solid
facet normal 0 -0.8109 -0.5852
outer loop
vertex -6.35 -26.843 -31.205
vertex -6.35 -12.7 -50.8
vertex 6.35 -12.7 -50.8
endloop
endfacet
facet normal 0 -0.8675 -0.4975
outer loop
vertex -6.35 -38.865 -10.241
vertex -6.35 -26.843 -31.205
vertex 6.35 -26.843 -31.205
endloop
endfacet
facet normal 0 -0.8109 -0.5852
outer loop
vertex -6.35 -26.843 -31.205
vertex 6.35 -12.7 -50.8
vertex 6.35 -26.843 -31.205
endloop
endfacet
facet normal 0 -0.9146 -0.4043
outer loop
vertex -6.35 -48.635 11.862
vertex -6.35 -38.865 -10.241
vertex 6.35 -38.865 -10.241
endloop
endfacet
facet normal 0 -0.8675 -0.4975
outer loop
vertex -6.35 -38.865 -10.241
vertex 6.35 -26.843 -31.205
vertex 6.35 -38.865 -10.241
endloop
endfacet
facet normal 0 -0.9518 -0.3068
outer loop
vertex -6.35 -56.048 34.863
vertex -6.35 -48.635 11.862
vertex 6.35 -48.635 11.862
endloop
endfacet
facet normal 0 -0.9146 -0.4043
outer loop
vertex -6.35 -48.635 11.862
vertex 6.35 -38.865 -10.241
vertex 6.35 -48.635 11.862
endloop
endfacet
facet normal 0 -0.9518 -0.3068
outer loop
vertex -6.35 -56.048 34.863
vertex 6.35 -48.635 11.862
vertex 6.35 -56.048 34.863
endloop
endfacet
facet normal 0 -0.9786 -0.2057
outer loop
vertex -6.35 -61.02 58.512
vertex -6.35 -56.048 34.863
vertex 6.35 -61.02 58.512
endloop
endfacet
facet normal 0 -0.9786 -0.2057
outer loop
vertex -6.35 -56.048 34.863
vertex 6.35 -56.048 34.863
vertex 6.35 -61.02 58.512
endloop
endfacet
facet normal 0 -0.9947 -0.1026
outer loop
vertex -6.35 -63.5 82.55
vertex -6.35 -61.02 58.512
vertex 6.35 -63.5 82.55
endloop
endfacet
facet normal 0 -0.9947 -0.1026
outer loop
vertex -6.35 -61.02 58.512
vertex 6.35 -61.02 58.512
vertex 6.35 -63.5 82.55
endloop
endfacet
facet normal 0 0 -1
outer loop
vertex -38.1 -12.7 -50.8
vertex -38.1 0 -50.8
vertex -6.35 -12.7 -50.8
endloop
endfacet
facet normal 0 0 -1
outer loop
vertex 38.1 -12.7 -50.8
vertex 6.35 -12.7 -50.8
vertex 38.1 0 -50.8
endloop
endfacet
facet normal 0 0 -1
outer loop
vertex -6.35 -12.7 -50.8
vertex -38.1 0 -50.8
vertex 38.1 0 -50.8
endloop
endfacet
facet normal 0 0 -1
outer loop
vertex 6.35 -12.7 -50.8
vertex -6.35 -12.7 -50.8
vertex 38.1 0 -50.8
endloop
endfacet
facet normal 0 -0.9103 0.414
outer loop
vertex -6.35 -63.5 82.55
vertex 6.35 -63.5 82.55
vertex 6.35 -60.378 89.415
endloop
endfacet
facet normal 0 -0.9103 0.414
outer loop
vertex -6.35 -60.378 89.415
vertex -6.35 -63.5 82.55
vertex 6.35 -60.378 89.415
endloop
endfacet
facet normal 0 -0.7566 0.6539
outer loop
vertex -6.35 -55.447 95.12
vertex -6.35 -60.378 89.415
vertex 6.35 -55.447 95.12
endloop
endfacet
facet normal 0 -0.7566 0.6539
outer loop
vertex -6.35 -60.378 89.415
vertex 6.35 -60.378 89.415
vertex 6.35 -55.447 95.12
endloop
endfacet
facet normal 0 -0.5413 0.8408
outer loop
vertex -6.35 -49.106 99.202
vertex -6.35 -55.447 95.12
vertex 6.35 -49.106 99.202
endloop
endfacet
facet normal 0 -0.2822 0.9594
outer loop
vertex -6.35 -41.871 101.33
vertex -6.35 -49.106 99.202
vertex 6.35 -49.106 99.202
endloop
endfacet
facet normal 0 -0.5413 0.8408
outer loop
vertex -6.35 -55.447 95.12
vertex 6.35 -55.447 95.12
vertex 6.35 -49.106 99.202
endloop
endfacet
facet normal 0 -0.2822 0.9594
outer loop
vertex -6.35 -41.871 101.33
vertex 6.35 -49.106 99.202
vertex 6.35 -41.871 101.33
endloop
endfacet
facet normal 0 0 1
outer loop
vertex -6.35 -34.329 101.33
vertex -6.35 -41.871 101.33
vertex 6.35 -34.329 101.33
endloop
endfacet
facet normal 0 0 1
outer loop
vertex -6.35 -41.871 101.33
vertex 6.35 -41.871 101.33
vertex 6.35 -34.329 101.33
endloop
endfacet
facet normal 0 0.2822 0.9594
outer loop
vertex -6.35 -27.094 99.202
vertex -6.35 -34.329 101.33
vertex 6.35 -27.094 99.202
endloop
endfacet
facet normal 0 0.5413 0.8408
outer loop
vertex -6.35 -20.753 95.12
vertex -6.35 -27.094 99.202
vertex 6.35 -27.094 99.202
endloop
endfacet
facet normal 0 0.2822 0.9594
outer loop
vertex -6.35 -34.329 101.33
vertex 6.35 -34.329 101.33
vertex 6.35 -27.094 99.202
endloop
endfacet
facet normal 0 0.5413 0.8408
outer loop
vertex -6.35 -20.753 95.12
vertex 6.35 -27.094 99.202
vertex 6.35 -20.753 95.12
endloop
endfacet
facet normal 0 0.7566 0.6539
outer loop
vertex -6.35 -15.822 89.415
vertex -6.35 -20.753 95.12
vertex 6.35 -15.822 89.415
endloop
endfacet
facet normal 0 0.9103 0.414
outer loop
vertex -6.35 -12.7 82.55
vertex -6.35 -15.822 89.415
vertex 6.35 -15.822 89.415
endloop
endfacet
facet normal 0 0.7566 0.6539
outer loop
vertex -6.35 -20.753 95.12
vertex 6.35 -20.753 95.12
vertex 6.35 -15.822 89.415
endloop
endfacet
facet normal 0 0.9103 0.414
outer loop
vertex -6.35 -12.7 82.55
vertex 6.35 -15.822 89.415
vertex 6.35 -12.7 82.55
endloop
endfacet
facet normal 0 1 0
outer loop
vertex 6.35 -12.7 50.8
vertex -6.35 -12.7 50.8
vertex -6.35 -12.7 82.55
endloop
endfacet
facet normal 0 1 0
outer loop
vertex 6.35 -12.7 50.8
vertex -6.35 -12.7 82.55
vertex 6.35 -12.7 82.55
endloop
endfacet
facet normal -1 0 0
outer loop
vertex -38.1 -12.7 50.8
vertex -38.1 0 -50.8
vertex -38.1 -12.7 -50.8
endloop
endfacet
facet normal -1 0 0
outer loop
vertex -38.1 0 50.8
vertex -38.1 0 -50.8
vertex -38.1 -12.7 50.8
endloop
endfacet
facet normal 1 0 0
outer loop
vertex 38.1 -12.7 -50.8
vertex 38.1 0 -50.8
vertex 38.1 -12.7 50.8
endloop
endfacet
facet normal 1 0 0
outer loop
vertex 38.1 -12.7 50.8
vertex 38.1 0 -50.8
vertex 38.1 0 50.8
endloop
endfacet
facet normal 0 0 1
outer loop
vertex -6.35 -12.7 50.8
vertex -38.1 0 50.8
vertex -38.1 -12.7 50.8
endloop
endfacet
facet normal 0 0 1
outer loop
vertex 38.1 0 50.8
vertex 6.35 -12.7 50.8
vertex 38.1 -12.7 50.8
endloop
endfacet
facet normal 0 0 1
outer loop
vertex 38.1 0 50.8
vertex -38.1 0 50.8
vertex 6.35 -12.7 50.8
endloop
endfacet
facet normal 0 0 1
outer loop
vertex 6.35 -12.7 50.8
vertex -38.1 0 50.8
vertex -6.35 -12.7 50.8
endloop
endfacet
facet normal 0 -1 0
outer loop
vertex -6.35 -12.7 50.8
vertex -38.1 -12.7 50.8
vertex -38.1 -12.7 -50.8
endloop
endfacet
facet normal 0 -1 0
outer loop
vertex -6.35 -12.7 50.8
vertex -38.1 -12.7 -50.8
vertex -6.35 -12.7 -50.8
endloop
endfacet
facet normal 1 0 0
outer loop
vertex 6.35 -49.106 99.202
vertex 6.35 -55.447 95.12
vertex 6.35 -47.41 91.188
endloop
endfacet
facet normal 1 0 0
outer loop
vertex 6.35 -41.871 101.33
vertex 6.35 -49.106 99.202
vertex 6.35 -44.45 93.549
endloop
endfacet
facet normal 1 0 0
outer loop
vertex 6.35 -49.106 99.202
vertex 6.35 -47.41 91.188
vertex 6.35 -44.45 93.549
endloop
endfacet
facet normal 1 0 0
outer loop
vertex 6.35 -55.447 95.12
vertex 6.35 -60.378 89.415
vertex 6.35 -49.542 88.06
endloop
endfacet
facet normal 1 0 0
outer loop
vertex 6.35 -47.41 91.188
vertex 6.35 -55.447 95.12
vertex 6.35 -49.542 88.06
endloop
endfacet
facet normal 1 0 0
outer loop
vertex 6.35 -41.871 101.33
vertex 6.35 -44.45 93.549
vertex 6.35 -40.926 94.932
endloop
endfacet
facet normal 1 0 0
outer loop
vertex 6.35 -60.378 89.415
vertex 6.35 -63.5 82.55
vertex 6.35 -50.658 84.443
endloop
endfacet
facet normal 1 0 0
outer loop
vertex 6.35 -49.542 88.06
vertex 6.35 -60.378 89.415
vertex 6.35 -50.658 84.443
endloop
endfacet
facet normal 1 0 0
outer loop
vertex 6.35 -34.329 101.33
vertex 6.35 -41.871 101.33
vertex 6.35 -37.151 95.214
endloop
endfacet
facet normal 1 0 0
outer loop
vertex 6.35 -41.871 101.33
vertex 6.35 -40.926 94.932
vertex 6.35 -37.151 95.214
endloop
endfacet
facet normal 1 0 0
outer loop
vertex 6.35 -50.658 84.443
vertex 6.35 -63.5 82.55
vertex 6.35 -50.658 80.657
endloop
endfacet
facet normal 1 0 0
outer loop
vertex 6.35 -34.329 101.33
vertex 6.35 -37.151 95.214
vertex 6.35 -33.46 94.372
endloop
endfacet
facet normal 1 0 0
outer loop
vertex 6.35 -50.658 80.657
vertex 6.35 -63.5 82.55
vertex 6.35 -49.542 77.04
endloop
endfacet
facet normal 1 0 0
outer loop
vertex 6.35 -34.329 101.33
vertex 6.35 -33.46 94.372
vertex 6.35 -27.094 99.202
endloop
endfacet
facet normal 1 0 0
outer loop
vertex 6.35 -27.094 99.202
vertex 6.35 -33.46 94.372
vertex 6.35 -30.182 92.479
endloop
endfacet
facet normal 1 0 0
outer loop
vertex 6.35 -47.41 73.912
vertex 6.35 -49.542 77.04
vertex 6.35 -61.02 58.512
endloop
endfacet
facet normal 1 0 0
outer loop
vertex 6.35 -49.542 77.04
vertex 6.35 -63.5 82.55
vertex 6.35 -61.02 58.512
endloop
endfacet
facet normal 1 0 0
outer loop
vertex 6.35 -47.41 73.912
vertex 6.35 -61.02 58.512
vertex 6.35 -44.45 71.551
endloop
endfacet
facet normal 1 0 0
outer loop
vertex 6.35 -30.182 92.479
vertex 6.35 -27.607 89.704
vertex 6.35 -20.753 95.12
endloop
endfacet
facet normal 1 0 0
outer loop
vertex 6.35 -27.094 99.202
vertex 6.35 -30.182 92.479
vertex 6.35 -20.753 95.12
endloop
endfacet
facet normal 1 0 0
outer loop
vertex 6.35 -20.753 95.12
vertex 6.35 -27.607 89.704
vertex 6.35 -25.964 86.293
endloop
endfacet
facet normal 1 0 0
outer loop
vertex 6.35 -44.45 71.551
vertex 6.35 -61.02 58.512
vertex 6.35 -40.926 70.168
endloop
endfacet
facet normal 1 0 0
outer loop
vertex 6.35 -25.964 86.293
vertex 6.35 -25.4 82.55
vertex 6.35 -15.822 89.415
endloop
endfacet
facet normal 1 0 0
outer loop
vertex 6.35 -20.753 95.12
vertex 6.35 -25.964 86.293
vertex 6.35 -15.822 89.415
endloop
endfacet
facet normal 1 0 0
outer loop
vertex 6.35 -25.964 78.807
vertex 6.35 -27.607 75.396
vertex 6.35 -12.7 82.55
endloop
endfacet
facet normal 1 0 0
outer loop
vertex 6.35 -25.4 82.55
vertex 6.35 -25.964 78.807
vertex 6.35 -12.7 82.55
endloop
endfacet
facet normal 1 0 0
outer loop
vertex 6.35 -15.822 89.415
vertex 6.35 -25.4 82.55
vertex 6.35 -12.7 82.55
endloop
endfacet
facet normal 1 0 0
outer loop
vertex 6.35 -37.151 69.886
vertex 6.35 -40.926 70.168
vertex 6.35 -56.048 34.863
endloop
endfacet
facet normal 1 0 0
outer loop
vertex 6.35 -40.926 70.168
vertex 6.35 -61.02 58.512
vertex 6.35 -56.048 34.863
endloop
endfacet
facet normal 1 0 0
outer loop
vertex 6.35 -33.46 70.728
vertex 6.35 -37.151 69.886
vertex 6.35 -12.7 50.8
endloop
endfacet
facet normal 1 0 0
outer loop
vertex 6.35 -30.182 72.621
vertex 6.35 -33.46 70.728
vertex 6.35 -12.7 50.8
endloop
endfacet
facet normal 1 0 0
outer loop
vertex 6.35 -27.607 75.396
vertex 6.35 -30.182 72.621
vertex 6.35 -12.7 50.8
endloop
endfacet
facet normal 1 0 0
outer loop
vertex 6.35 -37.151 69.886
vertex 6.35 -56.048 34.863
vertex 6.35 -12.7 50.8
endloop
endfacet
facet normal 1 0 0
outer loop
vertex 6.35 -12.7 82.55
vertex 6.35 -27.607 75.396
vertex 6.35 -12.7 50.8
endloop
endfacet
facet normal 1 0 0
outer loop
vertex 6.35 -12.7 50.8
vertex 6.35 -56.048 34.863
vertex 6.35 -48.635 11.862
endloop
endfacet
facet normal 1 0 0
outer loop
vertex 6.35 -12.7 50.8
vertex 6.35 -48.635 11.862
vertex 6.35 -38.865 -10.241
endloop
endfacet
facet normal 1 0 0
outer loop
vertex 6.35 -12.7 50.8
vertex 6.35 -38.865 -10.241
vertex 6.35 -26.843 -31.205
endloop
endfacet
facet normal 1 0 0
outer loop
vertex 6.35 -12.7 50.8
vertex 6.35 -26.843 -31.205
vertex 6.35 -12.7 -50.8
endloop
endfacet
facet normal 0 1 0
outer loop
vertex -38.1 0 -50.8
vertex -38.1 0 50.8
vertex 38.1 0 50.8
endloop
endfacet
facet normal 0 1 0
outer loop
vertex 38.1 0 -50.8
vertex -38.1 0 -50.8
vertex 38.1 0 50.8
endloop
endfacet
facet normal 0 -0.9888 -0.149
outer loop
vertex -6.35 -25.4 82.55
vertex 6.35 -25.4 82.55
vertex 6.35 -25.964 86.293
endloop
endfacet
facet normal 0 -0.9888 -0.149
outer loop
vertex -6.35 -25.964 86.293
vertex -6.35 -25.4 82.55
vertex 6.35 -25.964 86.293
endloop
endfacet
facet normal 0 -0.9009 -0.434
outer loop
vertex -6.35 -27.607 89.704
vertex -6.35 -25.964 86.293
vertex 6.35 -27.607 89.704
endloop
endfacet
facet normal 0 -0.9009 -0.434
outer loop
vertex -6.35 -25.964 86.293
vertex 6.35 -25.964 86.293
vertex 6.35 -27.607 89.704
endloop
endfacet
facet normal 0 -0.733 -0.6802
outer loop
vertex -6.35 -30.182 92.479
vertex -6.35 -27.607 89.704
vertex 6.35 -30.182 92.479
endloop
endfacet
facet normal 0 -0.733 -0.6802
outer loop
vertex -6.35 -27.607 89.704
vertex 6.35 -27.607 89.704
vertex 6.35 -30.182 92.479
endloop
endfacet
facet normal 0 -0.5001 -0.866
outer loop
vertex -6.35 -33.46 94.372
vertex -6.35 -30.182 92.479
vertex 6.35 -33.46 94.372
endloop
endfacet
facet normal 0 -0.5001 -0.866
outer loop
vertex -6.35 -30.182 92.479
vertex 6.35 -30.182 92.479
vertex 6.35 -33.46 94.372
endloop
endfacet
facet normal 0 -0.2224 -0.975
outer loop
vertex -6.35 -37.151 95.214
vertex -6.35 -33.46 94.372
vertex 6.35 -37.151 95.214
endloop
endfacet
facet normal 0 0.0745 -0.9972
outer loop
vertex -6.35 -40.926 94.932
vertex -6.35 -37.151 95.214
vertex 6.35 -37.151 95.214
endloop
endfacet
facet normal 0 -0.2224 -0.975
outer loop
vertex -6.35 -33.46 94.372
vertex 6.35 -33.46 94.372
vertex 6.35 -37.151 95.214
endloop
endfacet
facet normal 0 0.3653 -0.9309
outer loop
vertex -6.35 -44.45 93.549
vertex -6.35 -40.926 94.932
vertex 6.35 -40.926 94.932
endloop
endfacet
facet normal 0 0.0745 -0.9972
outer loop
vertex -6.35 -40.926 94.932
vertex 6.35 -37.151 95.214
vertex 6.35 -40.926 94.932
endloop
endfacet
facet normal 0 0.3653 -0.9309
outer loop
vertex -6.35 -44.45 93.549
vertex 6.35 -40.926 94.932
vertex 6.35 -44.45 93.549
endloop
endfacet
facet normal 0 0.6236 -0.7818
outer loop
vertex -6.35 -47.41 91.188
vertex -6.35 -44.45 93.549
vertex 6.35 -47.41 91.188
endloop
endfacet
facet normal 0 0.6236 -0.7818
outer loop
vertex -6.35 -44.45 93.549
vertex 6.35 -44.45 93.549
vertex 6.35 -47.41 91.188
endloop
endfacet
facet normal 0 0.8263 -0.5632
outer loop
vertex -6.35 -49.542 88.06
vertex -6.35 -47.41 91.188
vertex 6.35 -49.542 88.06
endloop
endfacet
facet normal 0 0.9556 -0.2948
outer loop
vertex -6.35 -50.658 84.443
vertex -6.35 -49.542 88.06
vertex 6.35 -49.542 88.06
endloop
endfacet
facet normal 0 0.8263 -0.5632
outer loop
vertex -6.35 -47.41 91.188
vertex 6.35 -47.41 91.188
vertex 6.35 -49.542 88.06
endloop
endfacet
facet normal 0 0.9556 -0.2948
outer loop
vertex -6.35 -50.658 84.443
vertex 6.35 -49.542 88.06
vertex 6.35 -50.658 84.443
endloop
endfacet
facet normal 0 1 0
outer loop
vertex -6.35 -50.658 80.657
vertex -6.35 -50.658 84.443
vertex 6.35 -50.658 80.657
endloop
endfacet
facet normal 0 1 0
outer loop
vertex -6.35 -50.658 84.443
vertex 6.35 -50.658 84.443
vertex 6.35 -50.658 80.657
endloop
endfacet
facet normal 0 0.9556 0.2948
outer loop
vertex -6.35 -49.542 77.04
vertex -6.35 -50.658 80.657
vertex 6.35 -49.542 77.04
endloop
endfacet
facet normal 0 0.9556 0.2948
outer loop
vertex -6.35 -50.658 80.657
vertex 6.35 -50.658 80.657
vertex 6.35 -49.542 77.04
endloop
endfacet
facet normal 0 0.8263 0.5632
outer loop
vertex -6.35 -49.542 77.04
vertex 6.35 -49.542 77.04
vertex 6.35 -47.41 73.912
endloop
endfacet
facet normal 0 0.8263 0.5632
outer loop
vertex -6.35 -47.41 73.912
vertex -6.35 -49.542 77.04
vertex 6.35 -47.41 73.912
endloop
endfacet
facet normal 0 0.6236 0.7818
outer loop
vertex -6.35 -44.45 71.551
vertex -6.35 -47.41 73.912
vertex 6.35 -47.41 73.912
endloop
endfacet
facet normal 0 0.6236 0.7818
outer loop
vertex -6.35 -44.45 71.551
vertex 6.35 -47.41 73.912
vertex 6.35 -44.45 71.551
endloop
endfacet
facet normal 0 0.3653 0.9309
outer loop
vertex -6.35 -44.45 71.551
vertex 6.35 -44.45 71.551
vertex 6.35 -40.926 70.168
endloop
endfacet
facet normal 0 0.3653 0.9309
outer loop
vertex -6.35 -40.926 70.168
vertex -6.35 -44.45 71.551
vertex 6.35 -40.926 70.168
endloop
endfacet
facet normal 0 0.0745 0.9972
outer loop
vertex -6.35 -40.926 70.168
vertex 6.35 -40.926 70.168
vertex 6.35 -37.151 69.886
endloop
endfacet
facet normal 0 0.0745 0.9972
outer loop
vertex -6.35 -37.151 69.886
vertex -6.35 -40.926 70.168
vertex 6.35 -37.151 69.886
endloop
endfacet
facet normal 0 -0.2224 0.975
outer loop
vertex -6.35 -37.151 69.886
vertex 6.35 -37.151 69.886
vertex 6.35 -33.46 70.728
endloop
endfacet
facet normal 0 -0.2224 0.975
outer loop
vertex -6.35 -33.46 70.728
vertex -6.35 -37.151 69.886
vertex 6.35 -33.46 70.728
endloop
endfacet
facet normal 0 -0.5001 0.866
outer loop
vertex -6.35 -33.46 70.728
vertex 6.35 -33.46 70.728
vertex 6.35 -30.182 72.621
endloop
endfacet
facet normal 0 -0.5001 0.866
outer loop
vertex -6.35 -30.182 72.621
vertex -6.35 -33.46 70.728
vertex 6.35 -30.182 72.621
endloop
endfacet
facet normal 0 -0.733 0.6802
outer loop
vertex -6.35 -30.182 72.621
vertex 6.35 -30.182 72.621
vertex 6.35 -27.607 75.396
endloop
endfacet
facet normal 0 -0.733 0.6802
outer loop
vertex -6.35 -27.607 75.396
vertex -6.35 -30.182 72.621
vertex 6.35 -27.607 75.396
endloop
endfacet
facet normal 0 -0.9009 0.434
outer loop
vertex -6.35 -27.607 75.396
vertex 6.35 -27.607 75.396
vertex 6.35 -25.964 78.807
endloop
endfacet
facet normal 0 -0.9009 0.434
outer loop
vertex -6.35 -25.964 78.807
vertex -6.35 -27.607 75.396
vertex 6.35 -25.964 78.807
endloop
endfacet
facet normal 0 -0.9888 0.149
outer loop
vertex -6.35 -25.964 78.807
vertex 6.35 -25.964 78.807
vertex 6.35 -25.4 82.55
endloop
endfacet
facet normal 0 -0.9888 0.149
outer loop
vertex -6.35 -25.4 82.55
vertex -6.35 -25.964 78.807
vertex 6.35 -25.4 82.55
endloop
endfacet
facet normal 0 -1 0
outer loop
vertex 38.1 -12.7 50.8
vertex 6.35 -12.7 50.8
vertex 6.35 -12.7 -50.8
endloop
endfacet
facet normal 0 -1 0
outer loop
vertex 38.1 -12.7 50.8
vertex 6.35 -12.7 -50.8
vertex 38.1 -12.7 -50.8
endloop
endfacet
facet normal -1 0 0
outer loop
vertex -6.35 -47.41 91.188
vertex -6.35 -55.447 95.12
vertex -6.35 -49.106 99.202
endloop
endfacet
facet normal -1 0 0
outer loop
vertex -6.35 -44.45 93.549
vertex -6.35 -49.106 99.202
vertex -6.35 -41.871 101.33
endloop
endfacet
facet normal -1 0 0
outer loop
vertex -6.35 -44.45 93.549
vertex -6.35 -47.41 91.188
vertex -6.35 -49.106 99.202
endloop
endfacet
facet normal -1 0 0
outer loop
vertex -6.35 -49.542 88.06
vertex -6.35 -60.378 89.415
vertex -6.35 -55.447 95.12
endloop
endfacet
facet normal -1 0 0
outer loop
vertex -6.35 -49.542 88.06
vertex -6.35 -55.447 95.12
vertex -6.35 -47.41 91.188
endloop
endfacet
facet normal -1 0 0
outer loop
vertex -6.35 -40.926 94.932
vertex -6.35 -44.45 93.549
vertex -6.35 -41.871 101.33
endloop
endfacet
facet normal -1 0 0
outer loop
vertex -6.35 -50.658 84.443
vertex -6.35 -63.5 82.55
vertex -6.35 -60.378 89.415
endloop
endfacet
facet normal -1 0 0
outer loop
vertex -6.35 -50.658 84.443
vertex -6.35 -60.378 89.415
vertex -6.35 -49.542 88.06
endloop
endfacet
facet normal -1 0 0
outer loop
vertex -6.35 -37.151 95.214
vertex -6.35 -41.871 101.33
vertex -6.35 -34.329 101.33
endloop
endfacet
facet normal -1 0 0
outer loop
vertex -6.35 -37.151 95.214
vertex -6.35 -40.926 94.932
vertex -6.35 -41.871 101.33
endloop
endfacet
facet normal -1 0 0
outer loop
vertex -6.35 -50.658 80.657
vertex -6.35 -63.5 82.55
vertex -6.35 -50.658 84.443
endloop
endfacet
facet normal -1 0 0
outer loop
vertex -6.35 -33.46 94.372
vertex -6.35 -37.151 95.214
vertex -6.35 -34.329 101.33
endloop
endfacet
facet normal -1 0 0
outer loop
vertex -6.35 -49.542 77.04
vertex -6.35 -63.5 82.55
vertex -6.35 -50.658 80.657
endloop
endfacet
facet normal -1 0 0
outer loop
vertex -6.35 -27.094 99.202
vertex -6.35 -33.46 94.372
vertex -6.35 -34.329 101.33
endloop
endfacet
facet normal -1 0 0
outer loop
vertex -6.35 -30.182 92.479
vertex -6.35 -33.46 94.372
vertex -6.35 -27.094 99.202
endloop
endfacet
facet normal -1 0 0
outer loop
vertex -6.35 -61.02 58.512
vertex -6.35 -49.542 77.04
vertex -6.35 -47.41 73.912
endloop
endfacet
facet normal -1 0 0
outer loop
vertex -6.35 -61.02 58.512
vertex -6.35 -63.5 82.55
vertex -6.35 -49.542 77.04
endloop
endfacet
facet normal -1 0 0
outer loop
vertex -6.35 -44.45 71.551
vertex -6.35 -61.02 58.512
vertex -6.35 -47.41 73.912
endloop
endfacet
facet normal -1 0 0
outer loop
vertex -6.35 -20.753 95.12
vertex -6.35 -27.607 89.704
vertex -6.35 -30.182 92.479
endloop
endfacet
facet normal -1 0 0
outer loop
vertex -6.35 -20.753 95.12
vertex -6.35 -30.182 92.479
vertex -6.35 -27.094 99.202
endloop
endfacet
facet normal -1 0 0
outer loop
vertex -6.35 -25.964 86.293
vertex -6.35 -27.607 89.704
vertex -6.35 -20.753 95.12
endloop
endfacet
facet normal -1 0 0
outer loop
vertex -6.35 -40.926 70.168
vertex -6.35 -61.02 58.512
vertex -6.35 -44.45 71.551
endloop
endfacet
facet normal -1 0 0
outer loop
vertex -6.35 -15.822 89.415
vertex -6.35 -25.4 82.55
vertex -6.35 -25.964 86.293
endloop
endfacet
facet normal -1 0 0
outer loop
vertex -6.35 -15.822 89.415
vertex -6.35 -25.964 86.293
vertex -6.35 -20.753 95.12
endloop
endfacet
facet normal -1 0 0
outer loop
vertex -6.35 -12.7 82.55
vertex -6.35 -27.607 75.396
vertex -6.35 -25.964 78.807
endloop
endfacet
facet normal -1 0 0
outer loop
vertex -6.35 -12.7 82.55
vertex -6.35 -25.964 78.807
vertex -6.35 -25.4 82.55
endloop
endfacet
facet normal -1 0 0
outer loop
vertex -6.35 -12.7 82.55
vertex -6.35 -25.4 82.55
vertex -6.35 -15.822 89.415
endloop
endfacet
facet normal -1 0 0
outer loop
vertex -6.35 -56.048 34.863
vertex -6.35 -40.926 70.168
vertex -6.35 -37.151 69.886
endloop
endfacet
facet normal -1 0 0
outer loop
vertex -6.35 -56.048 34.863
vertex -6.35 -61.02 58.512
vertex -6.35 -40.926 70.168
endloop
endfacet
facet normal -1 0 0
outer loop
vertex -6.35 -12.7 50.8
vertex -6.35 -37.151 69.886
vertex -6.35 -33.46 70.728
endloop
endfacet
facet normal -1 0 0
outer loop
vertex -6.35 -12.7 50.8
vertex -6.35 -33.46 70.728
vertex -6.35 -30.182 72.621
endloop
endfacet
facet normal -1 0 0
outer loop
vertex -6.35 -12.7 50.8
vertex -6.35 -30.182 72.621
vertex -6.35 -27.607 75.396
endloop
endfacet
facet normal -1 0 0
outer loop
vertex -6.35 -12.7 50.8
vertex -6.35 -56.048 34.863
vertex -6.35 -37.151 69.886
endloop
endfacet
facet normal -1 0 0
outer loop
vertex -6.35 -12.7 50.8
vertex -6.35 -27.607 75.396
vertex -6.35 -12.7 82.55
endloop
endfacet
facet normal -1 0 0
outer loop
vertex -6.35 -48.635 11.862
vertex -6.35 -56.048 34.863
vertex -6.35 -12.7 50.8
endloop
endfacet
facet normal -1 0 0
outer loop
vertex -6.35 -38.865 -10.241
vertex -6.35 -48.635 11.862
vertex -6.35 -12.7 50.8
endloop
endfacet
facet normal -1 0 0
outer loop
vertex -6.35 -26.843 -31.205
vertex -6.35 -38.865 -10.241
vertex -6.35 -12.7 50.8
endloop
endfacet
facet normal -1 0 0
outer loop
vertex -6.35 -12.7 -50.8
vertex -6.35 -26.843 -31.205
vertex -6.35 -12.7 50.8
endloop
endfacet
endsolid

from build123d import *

# Parameters (mm, degrees)
F0_W     = 76.2
F0_H     = 101.6
F1_DEPTH = 12.7
F2_W     = 12.7
F2_H     = 101.6
F3_DEPTH = 50.8
F4_W     = 12.7
F4_H     = 50.8
F5_DEPTH = 50.8
F6_R     = 12.7
F7_DEPTH = 25.4


with BuildPart() as f1:
    # F0 (on Front) → F1 (new body)
    with BuildSketch(Plane.XZ):
        Rectangle(F0_W, F0_H)
    extrude(amount=F1_DEPTH)

    # F2 (on face) → F3 (join)
    with BuildSketch(Plane.XZ.offset(12.7)):
        Rectangle(F2_W, F2_H)
    extrude(amount=F3_DEPTH)

    # F4 (on face) → F5 (join)
    with BuildSketch(Plane.XY.offset(50.8)):
        with Locations((0, -38.1)):
            Rectangle(F4_W, F4_H)
    extrude(amount=F5_DEPTH)

    # F6 (on face) → F7 (cut)
    with BuildSketch(Plane.YZ.offset(6.35)):
        with Locations((-38.1, 82.55)):
            Circle(F6_R)
        with BuildLine():
            ThreePointArc((-12.7, -50.8), (-48.635426, 11.861504), (-63.5, 82.55))
            Line((-63.5, 82.55), (-133.589551, -36.487788))
            Line((-133.589551, -36.487788), (-38.791277, -66.6712))
            Line((-38.791277, -66.6712), (-12.7, -50.8))
        make_face()
        with BuildLine():
            ThreePointArc((-63.5, 82.55), (-38.1, 101.6), (-12.7, 82.55))
            Line((-12.7, 82.55), (0, 103.250235))
            Line((0, 103.250235), (-76.800019, 103.250235))
            Line((-76.800019, 103.250235), (-63.5, 82.55))
        make_face()
    extrude(amount=-F7_DEPTH, mode=Mode.SUBTRACT)


solid = f1.part
